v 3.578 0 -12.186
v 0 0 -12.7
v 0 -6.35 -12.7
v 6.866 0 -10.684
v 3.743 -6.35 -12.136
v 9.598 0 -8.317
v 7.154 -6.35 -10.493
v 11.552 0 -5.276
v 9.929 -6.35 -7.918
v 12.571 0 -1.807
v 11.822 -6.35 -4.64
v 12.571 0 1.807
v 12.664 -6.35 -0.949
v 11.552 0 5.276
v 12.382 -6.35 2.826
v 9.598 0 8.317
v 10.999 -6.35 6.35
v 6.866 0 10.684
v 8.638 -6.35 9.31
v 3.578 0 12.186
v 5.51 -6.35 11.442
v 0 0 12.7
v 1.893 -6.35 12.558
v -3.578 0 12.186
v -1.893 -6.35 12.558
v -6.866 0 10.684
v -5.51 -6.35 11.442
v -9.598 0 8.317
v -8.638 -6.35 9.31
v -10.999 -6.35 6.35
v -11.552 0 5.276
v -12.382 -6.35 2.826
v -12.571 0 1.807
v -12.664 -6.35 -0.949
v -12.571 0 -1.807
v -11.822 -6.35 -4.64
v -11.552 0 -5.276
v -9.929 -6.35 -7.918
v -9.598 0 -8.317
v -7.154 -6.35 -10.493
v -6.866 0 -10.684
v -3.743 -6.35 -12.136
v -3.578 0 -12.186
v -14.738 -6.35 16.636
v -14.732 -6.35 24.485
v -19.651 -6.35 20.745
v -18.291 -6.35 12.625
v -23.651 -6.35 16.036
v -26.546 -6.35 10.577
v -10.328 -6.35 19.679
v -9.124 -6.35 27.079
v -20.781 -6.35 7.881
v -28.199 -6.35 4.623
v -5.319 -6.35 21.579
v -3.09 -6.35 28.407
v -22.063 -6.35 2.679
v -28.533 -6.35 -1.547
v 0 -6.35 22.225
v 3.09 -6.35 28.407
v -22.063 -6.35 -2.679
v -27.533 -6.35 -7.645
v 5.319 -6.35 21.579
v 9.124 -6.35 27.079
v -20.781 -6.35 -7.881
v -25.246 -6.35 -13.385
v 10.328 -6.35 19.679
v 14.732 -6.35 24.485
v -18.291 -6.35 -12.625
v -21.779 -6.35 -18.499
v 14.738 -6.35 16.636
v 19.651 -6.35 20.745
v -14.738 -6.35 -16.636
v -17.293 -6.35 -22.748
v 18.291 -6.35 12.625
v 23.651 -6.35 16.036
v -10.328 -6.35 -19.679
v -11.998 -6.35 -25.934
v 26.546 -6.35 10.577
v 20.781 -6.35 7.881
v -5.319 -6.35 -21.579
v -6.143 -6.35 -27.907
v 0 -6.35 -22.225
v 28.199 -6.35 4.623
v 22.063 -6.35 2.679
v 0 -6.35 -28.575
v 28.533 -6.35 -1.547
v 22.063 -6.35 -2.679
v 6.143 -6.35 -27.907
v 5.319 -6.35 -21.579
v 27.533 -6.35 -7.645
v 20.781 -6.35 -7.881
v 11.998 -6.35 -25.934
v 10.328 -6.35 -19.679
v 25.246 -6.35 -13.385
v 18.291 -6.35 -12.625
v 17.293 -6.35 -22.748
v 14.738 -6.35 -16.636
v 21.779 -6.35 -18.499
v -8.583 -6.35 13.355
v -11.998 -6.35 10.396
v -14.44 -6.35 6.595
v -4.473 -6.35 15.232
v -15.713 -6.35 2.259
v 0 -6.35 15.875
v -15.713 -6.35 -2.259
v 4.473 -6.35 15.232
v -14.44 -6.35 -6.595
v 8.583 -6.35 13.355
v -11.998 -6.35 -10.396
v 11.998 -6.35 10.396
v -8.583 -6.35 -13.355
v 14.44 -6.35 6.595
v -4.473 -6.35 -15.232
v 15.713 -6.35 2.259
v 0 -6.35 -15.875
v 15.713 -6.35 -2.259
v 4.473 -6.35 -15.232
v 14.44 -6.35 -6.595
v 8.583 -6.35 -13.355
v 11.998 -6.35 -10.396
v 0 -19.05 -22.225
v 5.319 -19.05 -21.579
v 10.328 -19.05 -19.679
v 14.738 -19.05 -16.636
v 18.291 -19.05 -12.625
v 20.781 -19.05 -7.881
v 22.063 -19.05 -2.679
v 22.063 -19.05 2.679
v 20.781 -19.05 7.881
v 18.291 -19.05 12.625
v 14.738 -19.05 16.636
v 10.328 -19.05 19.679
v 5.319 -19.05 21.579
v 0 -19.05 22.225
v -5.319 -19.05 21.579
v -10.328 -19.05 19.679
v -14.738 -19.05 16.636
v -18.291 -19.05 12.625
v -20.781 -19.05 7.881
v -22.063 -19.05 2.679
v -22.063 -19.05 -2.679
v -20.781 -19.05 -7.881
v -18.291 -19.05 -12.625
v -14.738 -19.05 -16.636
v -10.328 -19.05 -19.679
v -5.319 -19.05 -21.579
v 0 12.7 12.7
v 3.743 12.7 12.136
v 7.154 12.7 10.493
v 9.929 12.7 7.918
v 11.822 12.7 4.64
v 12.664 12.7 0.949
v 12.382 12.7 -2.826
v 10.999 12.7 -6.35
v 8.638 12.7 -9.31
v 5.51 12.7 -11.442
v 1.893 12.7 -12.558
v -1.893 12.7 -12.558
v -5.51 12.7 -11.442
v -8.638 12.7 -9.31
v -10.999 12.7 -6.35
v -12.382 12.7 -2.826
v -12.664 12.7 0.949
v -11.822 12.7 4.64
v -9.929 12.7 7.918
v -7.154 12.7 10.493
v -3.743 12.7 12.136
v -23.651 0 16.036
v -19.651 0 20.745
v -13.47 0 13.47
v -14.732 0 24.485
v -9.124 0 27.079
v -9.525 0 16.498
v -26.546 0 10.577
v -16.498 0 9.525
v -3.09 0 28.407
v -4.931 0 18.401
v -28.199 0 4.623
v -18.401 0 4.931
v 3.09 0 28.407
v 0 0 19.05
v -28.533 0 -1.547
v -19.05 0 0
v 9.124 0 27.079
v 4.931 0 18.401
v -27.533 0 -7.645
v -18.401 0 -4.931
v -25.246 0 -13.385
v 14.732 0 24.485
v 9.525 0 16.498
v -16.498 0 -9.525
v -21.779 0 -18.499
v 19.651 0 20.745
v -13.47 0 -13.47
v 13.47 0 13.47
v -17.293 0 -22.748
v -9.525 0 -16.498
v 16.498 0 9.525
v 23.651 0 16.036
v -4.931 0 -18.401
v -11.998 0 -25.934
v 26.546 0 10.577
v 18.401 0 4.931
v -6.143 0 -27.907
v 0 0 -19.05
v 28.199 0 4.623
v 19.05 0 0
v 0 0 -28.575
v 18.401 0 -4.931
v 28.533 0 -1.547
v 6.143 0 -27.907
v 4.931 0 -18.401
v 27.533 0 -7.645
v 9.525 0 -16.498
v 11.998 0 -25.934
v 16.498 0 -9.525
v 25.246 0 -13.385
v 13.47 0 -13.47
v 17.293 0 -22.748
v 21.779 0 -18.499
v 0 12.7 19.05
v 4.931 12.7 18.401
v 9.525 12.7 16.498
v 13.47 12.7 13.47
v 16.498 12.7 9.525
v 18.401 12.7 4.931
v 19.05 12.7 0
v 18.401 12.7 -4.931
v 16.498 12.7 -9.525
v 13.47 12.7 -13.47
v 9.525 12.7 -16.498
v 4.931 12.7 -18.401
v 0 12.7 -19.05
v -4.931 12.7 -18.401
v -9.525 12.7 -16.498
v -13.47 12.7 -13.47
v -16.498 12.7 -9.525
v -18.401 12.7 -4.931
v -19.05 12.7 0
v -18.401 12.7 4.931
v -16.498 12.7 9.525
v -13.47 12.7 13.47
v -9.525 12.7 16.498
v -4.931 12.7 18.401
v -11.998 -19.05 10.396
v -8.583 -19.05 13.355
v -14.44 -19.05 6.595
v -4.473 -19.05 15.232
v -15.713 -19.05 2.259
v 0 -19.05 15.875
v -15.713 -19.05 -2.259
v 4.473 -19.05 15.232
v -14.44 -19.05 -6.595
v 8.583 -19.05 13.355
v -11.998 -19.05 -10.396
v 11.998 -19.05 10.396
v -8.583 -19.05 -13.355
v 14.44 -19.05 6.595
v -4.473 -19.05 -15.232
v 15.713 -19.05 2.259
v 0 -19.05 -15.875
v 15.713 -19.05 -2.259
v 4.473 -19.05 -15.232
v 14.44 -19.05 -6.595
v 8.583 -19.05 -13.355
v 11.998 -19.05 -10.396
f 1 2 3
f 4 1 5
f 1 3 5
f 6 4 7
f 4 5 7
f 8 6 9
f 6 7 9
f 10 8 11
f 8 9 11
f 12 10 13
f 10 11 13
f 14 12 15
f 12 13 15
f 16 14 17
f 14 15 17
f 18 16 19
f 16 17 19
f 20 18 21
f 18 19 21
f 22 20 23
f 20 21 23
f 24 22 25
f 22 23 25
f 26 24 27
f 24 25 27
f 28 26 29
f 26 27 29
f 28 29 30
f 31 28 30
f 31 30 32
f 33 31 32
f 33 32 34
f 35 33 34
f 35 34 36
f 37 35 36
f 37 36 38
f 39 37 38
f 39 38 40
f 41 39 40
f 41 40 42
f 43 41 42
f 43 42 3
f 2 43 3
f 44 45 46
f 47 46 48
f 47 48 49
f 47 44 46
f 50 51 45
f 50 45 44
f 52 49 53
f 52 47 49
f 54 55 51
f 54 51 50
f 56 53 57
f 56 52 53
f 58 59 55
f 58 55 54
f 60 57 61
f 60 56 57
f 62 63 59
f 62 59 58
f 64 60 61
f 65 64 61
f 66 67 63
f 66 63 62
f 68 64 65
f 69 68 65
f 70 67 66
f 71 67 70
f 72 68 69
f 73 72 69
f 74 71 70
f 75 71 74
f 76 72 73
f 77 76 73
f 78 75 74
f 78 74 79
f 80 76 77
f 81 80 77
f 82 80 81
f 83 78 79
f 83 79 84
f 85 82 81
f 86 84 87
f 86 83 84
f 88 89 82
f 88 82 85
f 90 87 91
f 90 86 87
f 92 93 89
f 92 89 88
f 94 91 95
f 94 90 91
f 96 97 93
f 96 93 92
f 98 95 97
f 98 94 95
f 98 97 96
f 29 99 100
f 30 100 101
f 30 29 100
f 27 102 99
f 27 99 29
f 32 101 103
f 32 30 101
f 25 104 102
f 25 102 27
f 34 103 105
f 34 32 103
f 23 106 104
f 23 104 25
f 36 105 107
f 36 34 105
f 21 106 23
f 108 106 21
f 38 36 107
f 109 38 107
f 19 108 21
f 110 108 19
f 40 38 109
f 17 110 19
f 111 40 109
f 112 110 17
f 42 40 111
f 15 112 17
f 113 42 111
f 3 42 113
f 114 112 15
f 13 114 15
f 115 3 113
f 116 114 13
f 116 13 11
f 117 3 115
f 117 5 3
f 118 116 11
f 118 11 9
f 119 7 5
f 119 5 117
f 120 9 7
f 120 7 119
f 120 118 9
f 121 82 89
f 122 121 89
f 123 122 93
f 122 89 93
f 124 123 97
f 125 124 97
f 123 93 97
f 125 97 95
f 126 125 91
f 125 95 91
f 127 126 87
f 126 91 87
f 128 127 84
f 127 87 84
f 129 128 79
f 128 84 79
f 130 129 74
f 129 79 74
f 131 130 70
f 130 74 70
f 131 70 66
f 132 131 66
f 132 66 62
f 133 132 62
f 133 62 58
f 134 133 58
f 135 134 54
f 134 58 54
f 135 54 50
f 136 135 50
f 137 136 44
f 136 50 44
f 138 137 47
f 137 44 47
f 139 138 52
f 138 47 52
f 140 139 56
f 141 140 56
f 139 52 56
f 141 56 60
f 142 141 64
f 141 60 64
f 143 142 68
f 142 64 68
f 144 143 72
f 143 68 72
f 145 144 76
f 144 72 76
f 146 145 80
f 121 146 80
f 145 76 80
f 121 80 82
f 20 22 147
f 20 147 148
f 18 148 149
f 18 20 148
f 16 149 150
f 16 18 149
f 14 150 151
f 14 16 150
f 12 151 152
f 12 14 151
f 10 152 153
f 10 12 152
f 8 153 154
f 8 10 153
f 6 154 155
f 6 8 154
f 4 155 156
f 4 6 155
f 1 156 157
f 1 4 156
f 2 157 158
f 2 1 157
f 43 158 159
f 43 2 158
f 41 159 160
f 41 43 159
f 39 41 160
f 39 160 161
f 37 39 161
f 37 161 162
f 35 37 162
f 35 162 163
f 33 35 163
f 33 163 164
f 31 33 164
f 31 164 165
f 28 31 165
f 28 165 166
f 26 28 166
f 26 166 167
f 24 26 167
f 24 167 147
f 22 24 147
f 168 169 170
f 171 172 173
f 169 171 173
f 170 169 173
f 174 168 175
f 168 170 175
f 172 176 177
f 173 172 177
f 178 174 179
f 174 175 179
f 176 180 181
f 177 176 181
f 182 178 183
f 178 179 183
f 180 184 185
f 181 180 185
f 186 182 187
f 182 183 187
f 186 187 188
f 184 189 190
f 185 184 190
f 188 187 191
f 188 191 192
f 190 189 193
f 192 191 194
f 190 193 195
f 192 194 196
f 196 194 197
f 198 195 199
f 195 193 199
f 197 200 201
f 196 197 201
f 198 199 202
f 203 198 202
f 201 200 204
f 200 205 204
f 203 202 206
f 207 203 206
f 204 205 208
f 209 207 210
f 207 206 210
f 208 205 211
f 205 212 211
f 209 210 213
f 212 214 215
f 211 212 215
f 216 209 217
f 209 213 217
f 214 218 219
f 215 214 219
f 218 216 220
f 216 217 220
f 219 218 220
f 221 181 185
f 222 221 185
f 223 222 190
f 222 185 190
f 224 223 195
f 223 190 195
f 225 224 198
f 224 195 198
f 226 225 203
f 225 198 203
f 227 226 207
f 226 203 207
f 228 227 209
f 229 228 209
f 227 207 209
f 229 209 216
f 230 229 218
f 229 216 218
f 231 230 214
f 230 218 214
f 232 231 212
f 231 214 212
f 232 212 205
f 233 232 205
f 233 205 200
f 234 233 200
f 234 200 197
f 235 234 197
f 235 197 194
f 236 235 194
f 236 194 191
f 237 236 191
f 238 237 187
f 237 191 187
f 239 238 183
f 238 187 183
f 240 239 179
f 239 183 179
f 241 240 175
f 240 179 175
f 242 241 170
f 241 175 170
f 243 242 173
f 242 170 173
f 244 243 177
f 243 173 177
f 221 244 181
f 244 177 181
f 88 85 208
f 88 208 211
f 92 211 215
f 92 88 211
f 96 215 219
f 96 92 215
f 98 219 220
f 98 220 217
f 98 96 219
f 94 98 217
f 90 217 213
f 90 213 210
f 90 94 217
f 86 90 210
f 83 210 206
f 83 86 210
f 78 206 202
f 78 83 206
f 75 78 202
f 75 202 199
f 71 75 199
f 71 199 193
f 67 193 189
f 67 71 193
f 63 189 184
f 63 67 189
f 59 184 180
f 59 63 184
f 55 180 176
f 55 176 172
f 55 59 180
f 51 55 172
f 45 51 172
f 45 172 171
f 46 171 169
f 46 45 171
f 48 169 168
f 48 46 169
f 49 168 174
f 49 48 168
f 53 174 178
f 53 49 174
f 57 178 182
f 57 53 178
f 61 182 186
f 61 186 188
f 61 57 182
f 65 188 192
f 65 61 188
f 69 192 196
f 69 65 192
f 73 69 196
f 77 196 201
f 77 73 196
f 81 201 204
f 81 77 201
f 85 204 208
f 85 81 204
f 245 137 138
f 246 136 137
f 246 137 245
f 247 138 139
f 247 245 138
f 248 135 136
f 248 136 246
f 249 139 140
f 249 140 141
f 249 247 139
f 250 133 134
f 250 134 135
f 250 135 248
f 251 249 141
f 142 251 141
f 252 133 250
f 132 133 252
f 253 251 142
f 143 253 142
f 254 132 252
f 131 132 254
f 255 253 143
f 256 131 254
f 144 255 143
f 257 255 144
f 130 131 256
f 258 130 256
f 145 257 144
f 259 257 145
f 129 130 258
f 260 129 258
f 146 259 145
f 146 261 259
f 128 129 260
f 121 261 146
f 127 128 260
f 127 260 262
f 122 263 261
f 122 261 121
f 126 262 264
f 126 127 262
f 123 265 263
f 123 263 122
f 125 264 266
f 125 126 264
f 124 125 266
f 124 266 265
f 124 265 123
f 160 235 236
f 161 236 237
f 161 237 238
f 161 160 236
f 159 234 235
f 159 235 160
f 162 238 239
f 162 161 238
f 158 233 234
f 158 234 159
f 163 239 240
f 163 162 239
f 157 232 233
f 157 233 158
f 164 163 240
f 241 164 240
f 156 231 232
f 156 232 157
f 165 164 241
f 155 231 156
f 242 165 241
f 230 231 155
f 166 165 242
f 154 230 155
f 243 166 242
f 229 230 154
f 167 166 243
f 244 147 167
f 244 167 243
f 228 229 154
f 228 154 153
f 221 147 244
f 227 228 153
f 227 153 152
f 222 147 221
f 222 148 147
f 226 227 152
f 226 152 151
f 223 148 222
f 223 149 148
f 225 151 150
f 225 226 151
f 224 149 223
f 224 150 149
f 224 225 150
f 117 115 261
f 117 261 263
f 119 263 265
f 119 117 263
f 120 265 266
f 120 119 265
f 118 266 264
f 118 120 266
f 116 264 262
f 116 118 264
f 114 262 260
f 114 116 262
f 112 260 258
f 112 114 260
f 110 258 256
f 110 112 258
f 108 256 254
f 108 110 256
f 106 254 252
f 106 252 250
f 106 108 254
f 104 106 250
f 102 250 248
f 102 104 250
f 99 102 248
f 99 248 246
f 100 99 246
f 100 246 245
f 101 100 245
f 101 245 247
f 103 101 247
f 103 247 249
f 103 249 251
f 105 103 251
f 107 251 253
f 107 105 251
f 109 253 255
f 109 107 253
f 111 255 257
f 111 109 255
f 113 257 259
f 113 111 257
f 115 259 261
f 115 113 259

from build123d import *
from build123d.topology import SkipClean

# Parameters (mm, degrees)
SKETCH1_R    = 19.05
SKETCH1_R_2  = 12.7
TOP_DEPTH    = 12.7
MIDDLE_START = 6.35
SKETCH4_R    = 28.575
SKETCH4_R_2  = 12.7
MIDDLE_DEPTH = 6.35
SKETCH5_R    = 22.225
SKETCH5_R_2  = 15.875
BOTTOM_DEPTH = 12.7


with BuildPart() as part:
    # Sketch1 → Top (new body)
    with BuildSketch(Plane(origin=(0, 0, 0), x_dir=(1, 0, 0), z_dir=(0, 1, 0))):
        with Locations(Location((0, 0, 0), (0, 0, 270))):
            Circle(SKETCH1_R)
        with Locations(Location((0, 0, 0), (0, 0, 270))):
            Circle(SKETCH1_R_2, mode=Mode.SUBTRACT)
    extrude(amount=TOP_DEPTH)

    # Sketch4 → Middle (add)
    with SkipClean():  # the faces are left unmerged after this step: merging them gives an invalid solid
        with BuildSketch(Plane.XZ.offset(MIDDLE_START)):
            with Locations(Location((0, 0, 0), (0, 0, 270))):
                Circle(SKETCH4_R)
            with Locations(Location((0, 0, 0), (0, 0, 270))):
                Circle(SKETCH4_R_2, mode=Mode.SUBTRACT)
        extrude(amount=-MIDDLE_DEPTH)

    # Sketch5 → Bottom (add)
    with SkipClean():  # the faces are left unmerged after this step: merging them gives an invalid solid
        with BuildSketch(Plane.XZ.offset(6.35)):
            with Locations(Location((0, 0, 0), (0, 0, 270))):
                Circle(SKETCH5_R)
            with Locations(Location((0, 0, 0), (0, 0, 270))):
                Circle(SKETCH5_R_2, mode=Mode.SUBTRACT)
        extrude(amount=BOTTOM_DEPTH)


solid = part.part
